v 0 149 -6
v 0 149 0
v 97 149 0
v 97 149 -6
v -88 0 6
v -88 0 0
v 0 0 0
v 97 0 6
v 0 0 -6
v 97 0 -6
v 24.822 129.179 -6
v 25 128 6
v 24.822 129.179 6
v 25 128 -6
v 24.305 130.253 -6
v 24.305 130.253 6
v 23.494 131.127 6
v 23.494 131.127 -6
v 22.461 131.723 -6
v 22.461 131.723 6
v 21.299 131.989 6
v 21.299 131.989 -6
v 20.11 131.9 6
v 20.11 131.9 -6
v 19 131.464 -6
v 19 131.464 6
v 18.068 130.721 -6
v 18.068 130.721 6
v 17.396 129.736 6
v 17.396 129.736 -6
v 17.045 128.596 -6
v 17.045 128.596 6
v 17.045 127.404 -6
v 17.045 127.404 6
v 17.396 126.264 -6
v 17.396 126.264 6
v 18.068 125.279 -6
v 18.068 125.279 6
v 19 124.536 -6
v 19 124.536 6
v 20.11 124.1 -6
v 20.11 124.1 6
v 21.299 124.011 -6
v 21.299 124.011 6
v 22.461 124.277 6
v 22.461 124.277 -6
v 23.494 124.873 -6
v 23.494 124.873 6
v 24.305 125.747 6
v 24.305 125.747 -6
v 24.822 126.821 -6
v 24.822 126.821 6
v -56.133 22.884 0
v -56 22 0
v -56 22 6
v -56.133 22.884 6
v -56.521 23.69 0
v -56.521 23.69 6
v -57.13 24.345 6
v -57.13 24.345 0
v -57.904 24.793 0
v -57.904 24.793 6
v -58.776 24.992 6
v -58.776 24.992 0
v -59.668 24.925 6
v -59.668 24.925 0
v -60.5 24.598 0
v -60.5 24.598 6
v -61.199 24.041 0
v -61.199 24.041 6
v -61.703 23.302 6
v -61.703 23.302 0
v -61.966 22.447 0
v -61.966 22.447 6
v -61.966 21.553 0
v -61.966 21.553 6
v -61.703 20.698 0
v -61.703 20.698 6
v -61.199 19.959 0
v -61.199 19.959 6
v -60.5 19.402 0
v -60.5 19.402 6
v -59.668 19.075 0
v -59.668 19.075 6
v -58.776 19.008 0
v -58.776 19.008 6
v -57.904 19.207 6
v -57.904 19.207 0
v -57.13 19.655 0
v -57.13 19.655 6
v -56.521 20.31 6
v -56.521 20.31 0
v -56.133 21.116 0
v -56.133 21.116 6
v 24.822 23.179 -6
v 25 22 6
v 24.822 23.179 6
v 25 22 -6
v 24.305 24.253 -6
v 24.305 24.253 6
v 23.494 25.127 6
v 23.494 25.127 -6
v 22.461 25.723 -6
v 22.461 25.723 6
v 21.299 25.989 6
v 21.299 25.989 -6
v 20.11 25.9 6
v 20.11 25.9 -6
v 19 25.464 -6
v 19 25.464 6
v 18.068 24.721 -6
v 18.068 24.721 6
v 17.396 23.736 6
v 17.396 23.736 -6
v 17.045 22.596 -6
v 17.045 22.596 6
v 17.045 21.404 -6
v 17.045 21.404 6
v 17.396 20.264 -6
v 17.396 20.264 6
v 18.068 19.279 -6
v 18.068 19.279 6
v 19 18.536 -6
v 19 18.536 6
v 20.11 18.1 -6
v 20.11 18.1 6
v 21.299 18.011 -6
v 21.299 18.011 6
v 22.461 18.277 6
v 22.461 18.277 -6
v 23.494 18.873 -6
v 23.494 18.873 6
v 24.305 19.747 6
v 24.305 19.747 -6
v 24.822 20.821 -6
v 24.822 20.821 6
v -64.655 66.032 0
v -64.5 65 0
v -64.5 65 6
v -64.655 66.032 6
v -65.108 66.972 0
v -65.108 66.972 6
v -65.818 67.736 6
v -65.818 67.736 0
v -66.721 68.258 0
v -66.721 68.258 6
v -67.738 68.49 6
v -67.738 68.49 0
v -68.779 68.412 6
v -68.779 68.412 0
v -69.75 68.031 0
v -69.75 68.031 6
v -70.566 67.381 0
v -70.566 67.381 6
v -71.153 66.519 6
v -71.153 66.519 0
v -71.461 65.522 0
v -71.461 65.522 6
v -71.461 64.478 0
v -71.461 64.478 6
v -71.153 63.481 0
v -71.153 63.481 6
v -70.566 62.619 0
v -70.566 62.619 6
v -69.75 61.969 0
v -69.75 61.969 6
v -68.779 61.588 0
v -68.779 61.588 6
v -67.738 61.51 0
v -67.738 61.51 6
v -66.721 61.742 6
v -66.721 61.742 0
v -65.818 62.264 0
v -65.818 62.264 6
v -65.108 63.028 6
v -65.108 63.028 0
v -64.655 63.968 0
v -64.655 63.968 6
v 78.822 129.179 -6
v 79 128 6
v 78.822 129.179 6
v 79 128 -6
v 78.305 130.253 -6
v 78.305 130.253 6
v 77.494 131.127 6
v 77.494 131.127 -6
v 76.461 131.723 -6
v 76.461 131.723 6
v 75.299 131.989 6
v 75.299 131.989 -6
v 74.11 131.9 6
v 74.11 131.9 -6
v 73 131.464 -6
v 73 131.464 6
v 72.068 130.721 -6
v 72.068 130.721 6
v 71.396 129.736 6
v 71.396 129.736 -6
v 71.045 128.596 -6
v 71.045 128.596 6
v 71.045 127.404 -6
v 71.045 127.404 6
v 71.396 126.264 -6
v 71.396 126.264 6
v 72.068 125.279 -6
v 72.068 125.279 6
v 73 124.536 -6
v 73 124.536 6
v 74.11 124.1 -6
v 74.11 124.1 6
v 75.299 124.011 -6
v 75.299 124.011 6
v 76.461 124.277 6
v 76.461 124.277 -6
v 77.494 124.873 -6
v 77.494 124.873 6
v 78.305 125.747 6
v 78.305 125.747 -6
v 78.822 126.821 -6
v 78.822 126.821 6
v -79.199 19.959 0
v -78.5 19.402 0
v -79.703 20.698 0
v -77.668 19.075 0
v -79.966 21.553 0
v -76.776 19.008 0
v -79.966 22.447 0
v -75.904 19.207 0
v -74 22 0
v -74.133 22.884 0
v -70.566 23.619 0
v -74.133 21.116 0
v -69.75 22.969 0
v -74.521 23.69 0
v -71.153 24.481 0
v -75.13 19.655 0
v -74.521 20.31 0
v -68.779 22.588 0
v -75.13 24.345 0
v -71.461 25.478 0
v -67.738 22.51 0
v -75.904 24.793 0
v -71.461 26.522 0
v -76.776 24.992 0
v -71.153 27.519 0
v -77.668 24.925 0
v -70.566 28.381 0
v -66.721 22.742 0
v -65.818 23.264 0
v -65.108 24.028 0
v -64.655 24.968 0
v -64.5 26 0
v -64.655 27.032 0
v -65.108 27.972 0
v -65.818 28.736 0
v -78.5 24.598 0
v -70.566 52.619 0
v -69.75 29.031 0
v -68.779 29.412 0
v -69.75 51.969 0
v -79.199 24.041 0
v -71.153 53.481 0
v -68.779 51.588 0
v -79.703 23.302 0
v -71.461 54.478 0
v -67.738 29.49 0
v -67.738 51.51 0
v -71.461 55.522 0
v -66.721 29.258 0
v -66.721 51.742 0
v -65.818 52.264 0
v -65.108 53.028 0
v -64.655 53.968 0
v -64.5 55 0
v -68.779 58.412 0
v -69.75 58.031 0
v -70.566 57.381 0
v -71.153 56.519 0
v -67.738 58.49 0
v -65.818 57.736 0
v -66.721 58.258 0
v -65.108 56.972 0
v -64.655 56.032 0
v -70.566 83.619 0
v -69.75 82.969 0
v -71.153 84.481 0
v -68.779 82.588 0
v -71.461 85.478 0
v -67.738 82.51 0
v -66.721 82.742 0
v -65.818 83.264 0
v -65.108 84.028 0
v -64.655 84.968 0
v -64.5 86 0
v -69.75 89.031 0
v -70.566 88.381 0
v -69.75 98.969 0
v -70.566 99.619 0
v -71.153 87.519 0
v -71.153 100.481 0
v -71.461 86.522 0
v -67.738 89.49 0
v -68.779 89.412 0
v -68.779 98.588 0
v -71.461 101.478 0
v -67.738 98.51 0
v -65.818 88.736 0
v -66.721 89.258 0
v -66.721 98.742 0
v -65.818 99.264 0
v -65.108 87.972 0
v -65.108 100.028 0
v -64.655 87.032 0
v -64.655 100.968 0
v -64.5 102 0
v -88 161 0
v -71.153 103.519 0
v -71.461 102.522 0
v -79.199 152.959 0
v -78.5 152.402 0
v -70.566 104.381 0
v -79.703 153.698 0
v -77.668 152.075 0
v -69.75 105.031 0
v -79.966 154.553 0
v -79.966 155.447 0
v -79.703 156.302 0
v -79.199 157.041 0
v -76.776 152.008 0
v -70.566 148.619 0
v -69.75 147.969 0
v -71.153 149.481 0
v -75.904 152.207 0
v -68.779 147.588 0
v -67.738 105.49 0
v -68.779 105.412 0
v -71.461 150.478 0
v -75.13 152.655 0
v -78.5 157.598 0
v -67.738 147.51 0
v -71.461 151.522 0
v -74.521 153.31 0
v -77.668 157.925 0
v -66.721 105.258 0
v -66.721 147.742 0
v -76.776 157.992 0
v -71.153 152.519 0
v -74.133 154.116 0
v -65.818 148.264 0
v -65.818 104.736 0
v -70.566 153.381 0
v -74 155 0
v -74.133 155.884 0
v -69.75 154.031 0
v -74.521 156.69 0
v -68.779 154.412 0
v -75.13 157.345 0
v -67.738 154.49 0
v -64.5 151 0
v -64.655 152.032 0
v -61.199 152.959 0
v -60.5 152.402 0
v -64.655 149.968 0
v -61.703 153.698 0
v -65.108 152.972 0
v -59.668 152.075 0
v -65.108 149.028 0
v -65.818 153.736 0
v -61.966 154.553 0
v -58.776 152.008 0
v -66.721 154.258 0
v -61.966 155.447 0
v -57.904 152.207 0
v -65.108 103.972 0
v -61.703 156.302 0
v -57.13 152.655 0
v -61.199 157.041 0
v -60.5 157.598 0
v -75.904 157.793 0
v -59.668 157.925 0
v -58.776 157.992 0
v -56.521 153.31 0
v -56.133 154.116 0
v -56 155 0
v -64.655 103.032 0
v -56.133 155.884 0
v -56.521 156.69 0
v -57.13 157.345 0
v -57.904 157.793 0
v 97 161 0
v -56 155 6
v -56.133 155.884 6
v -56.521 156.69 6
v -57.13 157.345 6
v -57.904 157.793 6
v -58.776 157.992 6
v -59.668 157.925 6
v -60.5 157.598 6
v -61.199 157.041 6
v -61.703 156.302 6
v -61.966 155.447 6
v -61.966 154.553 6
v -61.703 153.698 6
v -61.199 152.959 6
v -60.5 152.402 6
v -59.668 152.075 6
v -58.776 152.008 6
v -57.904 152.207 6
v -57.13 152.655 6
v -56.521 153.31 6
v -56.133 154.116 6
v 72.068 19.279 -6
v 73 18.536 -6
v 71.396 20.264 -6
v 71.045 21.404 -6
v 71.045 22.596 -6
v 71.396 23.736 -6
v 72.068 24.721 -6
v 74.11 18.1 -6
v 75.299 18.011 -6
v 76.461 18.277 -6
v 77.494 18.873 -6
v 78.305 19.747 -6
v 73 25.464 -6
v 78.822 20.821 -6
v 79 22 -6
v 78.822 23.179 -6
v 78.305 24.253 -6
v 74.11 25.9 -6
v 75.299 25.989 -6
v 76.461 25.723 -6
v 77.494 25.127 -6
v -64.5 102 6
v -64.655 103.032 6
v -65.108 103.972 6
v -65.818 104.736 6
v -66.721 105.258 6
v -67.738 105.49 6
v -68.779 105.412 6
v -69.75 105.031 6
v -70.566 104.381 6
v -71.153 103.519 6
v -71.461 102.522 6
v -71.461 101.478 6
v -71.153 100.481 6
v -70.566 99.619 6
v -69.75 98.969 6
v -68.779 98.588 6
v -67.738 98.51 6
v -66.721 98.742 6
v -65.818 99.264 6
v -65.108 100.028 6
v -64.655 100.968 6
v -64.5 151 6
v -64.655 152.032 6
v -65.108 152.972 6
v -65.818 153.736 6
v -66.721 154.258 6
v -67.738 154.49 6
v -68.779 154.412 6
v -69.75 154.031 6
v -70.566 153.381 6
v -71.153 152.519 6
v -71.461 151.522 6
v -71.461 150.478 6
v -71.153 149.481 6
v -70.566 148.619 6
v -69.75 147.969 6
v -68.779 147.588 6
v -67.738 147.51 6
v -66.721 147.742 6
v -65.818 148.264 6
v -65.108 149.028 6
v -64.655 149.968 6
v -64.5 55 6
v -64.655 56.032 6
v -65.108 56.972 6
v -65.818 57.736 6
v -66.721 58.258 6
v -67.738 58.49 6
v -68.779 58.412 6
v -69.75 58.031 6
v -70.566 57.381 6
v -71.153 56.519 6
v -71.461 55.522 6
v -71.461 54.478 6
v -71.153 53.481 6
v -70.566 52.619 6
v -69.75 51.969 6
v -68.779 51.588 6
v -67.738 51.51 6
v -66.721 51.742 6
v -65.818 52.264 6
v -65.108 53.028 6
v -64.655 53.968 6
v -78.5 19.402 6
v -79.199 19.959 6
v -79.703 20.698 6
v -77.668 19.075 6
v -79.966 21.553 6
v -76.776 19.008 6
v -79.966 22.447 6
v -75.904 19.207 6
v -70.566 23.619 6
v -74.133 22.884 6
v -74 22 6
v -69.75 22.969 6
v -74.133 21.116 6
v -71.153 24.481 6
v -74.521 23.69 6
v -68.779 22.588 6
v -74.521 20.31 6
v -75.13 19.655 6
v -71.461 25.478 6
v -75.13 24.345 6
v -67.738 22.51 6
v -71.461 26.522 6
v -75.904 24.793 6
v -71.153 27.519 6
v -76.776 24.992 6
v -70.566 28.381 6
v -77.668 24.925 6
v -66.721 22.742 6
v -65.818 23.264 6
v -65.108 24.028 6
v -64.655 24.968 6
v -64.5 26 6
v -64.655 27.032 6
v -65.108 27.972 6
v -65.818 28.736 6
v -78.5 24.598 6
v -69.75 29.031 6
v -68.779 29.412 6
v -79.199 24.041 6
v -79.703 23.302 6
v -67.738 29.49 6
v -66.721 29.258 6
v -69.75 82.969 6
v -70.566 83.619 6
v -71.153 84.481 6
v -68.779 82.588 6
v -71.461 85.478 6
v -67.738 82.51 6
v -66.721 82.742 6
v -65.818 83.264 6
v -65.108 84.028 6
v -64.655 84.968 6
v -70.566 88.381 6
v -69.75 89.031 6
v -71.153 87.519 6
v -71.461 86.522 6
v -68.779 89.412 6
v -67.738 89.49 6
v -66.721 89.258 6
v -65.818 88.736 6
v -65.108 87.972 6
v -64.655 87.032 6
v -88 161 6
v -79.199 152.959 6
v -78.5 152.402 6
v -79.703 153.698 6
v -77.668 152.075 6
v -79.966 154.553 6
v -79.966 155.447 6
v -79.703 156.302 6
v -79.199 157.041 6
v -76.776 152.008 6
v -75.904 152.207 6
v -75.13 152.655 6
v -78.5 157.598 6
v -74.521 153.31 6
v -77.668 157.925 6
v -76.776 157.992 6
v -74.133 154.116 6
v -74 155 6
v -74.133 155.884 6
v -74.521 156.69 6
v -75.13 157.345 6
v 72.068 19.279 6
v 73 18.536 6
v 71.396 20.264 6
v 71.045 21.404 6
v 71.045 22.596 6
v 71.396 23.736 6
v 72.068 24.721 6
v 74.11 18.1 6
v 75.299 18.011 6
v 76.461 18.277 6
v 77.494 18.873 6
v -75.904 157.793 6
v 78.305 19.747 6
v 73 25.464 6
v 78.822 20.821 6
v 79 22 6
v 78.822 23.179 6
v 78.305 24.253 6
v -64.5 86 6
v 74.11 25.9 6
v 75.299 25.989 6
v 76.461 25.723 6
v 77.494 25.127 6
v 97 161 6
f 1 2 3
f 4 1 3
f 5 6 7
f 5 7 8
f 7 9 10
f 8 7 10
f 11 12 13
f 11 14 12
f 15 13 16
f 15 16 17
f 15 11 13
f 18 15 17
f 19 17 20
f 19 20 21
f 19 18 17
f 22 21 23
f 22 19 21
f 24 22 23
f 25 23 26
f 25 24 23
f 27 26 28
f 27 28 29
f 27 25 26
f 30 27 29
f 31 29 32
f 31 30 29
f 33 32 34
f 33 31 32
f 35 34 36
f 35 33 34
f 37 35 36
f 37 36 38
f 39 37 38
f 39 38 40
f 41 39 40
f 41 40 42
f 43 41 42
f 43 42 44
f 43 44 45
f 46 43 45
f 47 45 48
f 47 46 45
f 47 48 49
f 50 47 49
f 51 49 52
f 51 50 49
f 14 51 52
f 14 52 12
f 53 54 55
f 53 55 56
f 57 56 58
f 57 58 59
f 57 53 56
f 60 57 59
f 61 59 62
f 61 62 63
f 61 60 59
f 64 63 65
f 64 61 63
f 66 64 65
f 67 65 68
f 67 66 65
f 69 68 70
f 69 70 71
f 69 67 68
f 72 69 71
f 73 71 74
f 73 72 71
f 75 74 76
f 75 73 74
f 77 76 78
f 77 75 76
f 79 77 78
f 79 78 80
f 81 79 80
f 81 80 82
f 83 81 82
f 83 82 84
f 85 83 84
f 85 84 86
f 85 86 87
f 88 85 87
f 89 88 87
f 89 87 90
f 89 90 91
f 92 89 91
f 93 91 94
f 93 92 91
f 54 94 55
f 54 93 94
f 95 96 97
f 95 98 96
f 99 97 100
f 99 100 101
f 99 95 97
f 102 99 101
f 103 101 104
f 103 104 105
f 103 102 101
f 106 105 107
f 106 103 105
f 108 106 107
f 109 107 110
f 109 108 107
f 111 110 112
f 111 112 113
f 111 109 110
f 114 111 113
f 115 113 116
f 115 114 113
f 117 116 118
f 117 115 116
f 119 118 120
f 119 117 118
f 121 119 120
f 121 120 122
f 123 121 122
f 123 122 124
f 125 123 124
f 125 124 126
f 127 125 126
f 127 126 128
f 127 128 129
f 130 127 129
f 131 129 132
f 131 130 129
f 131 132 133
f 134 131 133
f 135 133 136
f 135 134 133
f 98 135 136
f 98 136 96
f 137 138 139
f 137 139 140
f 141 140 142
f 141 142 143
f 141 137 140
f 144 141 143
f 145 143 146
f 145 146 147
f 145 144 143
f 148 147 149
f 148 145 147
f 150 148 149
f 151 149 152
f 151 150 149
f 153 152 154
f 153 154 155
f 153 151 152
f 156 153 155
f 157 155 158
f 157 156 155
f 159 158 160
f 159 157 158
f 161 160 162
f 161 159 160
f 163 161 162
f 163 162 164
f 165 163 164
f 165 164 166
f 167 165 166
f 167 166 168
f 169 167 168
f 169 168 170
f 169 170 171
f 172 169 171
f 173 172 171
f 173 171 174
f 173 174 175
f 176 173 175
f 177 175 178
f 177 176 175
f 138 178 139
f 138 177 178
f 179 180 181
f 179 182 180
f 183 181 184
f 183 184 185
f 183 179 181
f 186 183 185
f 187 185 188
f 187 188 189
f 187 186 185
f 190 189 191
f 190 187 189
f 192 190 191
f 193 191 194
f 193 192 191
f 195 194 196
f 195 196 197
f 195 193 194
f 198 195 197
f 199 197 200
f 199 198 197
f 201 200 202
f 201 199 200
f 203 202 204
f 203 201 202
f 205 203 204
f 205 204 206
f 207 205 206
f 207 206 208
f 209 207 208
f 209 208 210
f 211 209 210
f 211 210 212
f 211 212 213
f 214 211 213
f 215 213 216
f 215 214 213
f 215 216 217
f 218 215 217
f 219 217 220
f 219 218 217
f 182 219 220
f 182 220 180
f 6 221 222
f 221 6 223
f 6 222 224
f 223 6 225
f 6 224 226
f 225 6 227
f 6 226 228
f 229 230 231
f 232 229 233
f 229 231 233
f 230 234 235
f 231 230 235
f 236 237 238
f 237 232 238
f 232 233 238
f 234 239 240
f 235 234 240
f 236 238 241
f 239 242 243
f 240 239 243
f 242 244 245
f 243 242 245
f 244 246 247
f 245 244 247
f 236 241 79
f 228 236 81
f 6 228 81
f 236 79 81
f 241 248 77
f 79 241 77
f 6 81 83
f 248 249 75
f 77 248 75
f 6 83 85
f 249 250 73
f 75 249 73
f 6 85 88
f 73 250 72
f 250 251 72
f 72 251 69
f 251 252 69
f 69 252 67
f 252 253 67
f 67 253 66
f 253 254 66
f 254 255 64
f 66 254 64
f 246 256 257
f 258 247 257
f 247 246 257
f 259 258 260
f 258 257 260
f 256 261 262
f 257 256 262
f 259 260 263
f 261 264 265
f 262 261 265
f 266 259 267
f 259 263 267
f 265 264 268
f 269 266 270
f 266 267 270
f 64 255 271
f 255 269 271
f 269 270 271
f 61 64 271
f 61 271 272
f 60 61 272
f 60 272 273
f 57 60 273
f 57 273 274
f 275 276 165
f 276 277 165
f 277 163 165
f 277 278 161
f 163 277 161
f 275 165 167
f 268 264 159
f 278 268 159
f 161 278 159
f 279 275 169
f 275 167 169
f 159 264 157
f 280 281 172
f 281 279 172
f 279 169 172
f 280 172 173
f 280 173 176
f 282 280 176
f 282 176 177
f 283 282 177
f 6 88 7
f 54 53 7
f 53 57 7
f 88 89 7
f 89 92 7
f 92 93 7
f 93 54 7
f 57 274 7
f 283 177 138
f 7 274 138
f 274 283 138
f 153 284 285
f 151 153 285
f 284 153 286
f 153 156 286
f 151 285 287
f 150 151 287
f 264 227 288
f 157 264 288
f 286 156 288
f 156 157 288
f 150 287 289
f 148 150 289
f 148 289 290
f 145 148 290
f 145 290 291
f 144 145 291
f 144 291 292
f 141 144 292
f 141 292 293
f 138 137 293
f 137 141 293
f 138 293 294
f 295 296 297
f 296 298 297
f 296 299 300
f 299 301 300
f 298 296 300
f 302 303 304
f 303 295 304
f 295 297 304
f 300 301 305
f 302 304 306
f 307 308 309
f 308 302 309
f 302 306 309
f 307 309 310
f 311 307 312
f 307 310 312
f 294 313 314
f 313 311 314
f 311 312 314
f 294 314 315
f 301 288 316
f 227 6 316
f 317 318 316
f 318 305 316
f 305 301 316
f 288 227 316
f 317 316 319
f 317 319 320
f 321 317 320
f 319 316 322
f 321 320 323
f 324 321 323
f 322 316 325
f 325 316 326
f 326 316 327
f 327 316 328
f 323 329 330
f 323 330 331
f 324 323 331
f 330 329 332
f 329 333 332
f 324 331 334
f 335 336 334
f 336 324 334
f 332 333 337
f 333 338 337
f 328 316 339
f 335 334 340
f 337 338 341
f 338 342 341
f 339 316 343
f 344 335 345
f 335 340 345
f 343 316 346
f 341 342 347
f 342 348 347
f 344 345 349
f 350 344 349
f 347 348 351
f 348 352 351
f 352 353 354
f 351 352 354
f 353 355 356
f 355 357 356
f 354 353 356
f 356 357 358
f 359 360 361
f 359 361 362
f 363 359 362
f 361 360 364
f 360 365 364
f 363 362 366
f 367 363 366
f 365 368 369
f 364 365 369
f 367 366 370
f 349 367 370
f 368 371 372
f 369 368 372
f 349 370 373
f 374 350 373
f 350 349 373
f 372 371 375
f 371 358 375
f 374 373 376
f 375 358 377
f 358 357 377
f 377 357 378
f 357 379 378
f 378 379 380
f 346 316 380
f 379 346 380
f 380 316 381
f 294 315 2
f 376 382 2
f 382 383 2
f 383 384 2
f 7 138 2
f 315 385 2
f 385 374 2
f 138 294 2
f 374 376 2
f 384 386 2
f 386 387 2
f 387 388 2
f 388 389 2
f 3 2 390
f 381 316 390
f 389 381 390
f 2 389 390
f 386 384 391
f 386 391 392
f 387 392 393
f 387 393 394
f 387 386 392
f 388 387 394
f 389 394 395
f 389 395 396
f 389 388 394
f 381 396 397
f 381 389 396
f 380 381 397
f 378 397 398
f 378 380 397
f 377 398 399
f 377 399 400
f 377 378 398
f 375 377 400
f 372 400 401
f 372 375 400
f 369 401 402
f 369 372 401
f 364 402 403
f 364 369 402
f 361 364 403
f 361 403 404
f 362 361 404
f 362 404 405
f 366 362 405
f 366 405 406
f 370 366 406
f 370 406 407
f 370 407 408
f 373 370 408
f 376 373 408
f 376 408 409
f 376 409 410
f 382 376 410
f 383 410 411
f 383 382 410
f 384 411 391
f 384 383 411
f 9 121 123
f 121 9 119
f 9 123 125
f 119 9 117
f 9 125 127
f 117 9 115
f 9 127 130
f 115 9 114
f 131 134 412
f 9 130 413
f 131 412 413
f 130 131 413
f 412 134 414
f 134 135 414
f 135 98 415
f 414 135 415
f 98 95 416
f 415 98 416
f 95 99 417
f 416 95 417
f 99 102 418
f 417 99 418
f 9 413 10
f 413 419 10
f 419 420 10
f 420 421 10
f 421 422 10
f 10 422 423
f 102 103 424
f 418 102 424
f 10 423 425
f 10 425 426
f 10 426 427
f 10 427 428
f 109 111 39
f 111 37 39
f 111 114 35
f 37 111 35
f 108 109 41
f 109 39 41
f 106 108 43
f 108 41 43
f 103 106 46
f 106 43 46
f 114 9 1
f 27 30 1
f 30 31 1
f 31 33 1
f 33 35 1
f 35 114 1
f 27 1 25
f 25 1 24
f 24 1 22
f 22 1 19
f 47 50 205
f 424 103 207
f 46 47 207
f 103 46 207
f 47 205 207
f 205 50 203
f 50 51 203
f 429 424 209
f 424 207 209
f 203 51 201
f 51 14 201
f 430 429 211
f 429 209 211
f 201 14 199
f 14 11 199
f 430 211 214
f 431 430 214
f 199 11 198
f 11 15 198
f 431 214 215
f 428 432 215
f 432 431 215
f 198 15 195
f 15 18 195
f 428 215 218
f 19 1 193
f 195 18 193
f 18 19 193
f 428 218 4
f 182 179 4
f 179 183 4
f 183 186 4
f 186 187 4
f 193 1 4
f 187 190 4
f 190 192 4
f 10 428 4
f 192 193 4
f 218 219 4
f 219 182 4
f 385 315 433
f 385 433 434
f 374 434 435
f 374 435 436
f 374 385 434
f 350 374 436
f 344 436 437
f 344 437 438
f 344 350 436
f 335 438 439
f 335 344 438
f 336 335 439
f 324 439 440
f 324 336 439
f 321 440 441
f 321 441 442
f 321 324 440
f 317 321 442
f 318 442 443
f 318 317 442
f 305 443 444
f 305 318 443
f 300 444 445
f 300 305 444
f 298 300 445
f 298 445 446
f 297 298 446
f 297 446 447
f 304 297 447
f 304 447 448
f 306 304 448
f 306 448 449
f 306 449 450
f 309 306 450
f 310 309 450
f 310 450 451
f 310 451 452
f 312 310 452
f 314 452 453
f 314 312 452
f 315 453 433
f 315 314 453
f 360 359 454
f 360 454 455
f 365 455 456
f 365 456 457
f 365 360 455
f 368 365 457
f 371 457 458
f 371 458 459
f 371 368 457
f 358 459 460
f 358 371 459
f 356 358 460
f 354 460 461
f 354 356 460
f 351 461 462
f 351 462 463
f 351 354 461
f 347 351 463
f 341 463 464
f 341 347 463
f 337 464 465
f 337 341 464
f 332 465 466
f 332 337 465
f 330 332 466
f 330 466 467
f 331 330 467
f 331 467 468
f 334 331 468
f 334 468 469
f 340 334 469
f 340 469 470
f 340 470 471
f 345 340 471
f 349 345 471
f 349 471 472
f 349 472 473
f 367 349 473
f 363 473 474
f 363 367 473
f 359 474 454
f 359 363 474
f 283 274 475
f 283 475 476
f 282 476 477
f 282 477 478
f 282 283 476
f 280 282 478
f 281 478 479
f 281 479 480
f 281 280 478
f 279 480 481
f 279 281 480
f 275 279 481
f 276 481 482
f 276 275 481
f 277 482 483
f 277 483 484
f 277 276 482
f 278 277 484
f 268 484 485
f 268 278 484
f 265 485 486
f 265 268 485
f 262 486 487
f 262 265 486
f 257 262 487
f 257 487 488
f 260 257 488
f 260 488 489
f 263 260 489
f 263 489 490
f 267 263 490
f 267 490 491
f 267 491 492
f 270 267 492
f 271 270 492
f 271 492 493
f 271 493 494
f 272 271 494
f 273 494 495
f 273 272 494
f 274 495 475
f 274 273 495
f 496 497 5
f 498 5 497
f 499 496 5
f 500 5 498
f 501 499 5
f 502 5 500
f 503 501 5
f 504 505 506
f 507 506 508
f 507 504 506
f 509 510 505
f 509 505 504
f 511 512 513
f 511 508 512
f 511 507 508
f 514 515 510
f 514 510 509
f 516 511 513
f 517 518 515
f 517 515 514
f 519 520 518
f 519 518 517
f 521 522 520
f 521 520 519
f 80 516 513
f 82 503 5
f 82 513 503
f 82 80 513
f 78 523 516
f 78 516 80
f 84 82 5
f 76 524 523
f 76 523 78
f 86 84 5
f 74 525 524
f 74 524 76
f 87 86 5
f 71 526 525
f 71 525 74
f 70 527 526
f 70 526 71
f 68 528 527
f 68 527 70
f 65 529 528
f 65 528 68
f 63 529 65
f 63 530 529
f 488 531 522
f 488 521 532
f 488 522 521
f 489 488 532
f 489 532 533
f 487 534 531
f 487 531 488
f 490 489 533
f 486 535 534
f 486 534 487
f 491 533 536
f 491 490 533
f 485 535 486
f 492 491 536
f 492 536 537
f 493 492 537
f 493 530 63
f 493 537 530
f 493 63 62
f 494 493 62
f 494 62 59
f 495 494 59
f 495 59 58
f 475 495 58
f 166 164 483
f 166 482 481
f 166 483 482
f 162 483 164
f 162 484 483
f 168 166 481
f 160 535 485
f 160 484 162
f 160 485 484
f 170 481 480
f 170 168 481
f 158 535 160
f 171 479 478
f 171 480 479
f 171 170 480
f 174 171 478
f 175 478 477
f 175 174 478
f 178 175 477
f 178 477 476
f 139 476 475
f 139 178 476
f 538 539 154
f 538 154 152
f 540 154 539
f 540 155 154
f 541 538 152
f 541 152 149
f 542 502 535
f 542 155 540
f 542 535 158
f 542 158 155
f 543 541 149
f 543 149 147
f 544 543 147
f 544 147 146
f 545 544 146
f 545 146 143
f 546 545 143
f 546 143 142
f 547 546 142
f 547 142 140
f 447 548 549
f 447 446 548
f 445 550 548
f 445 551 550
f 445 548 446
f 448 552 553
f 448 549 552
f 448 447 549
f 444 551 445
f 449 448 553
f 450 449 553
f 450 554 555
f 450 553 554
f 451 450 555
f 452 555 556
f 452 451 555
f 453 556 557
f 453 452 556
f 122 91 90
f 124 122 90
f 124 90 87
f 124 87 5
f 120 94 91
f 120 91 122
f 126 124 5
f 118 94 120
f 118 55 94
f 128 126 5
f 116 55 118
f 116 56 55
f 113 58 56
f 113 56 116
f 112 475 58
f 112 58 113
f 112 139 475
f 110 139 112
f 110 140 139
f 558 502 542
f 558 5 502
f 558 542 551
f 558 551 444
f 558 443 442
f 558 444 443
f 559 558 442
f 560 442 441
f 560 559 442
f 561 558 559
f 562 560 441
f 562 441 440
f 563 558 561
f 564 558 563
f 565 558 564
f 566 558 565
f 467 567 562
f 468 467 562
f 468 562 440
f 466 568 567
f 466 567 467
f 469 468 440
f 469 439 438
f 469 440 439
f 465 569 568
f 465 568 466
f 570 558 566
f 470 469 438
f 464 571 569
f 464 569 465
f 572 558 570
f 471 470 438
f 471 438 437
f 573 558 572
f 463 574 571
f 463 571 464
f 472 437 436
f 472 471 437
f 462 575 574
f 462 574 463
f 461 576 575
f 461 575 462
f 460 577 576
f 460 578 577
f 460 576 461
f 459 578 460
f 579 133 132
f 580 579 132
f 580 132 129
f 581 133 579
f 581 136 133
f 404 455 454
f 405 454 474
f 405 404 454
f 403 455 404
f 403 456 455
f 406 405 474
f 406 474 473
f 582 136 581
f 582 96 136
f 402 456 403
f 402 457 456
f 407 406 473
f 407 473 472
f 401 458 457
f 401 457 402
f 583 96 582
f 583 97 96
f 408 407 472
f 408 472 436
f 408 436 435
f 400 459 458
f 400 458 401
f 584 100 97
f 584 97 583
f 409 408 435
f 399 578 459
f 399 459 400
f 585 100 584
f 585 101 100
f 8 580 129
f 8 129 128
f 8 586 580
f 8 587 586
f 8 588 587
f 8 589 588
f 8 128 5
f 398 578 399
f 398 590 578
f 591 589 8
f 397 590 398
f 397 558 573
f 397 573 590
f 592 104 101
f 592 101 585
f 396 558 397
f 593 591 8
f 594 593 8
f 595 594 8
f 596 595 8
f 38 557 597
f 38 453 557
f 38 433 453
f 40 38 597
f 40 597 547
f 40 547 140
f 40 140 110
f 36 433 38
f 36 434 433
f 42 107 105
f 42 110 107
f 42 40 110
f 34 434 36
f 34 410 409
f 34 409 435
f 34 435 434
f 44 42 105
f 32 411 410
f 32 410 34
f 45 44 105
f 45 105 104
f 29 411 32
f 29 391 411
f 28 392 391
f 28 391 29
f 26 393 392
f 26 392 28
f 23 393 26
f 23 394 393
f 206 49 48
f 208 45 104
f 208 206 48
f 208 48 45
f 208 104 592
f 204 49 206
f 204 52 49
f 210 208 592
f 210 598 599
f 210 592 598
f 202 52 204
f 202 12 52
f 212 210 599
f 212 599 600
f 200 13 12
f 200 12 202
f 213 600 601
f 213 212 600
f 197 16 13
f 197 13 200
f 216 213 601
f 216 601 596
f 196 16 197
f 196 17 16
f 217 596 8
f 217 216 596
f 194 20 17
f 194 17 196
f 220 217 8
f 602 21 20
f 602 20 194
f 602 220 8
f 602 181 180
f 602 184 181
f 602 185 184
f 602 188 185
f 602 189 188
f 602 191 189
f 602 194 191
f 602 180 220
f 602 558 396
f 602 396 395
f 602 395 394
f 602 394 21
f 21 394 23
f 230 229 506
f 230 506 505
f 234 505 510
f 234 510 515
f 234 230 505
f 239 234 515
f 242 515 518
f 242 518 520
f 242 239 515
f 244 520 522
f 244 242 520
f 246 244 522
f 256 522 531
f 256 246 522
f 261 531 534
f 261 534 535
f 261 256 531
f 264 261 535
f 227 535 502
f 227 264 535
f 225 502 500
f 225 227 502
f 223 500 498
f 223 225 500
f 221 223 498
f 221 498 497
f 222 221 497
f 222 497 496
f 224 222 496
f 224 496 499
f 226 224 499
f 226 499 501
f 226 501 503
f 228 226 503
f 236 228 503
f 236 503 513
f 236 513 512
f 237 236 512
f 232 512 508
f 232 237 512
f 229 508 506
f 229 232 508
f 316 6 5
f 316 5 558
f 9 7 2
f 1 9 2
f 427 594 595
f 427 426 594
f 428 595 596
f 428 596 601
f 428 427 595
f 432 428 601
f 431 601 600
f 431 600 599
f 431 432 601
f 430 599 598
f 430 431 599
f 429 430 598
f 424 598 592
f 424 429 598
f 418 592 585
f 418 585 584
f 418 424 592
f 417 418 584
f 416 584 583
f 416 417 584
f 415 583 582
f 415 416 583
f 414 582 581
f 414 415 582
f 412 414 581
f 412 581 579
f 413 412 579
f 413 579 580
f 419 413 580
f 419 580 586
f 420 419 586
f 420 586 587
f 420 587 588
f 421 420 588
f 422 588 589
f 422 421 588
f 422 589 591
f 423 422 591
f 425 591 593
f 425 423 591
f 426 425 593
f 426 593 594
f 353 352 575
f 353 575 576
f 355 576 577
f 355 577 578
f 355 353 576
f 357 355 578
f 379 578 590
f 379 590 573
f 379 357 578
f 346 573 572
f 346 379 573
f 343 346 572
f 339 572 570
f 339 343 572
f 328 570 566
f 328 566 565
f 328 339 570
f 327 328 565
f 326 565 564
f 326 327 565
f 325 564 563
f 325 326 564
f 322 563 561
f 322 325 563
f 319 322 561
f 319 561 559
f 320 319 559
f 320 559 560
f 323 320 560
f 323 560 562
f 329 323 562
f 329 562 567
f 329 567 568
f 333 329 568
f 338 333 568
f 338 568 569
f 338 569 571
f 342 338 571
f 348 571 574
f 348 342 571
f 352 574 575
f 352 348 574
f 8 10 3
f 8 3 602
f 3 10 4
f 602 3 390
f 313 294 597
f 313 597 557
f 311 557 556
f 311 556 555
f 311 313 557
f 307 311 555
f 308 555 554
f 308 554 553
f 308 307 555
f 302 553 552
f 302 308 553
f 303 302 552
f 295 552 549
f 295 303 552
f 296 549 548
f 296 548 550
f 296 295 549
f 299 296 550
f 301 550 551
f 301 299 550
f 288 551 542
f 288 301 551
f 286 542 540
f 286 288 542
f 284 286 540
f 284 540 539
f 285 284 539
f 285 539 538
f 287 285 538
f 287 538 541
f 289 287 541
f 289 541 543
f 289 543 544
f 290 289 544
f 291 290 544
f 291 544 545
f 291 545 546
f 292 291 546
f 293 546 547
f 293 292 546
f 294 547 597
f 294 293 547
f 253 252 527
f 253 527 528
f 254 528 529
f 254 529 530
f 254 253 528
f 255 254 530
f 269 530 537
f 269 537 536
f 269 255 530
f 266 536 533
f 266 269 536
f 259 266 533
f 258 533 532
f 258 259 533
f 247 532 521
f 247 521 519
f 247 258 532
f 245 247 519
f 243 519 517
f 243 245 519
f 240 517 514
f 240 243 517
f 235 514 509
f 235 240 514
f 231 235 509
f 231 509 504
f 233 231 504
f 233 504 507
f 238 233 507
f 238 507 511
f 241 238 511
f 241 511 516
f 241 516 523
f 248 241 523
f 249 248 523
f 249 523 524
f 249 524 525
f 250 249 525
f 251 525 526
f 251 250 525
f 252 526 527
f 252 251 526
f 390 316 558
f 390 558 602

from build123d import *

# Parameters (mm, degrees)
SKETCH1_W           = 97
SKETCH1_H           = 149
SKETCH1_R           = 4
BOSS_EXTRUDE1_DEPTH = 6
SKETCH3_W           = 185
SKETCH3_H           = 161
SKETCH3_R           = 3
SKETCH3_R_2         = 3.5
SKETCH3_R_3         = 4
BOSS_EXTRUDE2_DEPTH = 6


with BuildPart() as part:
    # Sketch1 → Boss-Extrude1 (new body)
    with BuildSketch(Plane.XY):
        with Locations((48.5, 74.5)):
            Rectangle(SKETCH1_W, SKETCH1_H)
        with Locations((21, 128)):
            Circle(SKETCH1_R, mode=Mode.SUBTRACT)
        with Locations((75, 128)):
            Circle(SKETCH1_R, mode=Mode.SUBTRACT)
        with Locations((75, 22)):
            Circle(SKETCH1_R, mode=Mode.SUBTRACT)
        with Locations((21, 22)):
            Circle(SKETCH1_R, mode=Mode.SUBTRACT)
    extrude(amount=-BOSS_EXTRUDE1_DEPTH)

    # Sketch3 → Boss-Extrude2 (add)
    with BuildSketch(Plane.XY):
        with Locations((4.5, 80.5)):
            Rectangle(SKETCH3_W, SKETCH3_H)
        with Locations((-77, 155)):
            Circle(SKETCH3_R, mode=Mode.SUBTRACT)
        with Locations((-59, 22)):
            Circle(SKETCH3_R, mode=Mode.SUBTRACT)
        with Locations((-68, 26)):
            Circle(SKETCH3_R_2, mode=Mode.SUBTRACT)
        with Locations((-77, 22)):
            Circle(SKETCH3_R, mode=Mode.SUBTRACT)
        with Locations((-68, 102)):
            Circle(SKETCH3_R_2, mode=Mode.SUBTRACT)
        with Locations((-68, 86)):
            Circle(SKETCH3_R_2, mode=Mode.SUBTRACT)
        with Locations((-68, 65)):
            Circle(SKETCH3_R_2, mode=Mode.SUBTRACT)
        with Locations((-68, 55)):
            Circle(SKETCH3_R_2, mode=Mode.SUBTRACT)
        with Locations((-59, 155)):
            Circle(SKETCH3_R, mode=Mode.SUBTRACT)
        with Locations((-68, 151)):
            Circle(SKETCH3_R_2, mode=Mode.SUBTRACT)
        with Locations((21, 22)):
            Circle(SKETCH3_R_3, mode=Mode.SUBTRACT)
        with Locations((75, 22)):
            Circle(SKETCH3_R_3, mode=Mode.SUBTRACT)
        with Locations((75, 128)):
            Circle(SKETCH3_R_3, mode=Mode.SUBTRACT)
        with Locations((21, 128)):
            Circle(SKETCH3_R_3, mode=Mode.SUBTRACT)
    extrude(amount=BOSS_EXTRUDE2_DEPTH)


solid = part.part
